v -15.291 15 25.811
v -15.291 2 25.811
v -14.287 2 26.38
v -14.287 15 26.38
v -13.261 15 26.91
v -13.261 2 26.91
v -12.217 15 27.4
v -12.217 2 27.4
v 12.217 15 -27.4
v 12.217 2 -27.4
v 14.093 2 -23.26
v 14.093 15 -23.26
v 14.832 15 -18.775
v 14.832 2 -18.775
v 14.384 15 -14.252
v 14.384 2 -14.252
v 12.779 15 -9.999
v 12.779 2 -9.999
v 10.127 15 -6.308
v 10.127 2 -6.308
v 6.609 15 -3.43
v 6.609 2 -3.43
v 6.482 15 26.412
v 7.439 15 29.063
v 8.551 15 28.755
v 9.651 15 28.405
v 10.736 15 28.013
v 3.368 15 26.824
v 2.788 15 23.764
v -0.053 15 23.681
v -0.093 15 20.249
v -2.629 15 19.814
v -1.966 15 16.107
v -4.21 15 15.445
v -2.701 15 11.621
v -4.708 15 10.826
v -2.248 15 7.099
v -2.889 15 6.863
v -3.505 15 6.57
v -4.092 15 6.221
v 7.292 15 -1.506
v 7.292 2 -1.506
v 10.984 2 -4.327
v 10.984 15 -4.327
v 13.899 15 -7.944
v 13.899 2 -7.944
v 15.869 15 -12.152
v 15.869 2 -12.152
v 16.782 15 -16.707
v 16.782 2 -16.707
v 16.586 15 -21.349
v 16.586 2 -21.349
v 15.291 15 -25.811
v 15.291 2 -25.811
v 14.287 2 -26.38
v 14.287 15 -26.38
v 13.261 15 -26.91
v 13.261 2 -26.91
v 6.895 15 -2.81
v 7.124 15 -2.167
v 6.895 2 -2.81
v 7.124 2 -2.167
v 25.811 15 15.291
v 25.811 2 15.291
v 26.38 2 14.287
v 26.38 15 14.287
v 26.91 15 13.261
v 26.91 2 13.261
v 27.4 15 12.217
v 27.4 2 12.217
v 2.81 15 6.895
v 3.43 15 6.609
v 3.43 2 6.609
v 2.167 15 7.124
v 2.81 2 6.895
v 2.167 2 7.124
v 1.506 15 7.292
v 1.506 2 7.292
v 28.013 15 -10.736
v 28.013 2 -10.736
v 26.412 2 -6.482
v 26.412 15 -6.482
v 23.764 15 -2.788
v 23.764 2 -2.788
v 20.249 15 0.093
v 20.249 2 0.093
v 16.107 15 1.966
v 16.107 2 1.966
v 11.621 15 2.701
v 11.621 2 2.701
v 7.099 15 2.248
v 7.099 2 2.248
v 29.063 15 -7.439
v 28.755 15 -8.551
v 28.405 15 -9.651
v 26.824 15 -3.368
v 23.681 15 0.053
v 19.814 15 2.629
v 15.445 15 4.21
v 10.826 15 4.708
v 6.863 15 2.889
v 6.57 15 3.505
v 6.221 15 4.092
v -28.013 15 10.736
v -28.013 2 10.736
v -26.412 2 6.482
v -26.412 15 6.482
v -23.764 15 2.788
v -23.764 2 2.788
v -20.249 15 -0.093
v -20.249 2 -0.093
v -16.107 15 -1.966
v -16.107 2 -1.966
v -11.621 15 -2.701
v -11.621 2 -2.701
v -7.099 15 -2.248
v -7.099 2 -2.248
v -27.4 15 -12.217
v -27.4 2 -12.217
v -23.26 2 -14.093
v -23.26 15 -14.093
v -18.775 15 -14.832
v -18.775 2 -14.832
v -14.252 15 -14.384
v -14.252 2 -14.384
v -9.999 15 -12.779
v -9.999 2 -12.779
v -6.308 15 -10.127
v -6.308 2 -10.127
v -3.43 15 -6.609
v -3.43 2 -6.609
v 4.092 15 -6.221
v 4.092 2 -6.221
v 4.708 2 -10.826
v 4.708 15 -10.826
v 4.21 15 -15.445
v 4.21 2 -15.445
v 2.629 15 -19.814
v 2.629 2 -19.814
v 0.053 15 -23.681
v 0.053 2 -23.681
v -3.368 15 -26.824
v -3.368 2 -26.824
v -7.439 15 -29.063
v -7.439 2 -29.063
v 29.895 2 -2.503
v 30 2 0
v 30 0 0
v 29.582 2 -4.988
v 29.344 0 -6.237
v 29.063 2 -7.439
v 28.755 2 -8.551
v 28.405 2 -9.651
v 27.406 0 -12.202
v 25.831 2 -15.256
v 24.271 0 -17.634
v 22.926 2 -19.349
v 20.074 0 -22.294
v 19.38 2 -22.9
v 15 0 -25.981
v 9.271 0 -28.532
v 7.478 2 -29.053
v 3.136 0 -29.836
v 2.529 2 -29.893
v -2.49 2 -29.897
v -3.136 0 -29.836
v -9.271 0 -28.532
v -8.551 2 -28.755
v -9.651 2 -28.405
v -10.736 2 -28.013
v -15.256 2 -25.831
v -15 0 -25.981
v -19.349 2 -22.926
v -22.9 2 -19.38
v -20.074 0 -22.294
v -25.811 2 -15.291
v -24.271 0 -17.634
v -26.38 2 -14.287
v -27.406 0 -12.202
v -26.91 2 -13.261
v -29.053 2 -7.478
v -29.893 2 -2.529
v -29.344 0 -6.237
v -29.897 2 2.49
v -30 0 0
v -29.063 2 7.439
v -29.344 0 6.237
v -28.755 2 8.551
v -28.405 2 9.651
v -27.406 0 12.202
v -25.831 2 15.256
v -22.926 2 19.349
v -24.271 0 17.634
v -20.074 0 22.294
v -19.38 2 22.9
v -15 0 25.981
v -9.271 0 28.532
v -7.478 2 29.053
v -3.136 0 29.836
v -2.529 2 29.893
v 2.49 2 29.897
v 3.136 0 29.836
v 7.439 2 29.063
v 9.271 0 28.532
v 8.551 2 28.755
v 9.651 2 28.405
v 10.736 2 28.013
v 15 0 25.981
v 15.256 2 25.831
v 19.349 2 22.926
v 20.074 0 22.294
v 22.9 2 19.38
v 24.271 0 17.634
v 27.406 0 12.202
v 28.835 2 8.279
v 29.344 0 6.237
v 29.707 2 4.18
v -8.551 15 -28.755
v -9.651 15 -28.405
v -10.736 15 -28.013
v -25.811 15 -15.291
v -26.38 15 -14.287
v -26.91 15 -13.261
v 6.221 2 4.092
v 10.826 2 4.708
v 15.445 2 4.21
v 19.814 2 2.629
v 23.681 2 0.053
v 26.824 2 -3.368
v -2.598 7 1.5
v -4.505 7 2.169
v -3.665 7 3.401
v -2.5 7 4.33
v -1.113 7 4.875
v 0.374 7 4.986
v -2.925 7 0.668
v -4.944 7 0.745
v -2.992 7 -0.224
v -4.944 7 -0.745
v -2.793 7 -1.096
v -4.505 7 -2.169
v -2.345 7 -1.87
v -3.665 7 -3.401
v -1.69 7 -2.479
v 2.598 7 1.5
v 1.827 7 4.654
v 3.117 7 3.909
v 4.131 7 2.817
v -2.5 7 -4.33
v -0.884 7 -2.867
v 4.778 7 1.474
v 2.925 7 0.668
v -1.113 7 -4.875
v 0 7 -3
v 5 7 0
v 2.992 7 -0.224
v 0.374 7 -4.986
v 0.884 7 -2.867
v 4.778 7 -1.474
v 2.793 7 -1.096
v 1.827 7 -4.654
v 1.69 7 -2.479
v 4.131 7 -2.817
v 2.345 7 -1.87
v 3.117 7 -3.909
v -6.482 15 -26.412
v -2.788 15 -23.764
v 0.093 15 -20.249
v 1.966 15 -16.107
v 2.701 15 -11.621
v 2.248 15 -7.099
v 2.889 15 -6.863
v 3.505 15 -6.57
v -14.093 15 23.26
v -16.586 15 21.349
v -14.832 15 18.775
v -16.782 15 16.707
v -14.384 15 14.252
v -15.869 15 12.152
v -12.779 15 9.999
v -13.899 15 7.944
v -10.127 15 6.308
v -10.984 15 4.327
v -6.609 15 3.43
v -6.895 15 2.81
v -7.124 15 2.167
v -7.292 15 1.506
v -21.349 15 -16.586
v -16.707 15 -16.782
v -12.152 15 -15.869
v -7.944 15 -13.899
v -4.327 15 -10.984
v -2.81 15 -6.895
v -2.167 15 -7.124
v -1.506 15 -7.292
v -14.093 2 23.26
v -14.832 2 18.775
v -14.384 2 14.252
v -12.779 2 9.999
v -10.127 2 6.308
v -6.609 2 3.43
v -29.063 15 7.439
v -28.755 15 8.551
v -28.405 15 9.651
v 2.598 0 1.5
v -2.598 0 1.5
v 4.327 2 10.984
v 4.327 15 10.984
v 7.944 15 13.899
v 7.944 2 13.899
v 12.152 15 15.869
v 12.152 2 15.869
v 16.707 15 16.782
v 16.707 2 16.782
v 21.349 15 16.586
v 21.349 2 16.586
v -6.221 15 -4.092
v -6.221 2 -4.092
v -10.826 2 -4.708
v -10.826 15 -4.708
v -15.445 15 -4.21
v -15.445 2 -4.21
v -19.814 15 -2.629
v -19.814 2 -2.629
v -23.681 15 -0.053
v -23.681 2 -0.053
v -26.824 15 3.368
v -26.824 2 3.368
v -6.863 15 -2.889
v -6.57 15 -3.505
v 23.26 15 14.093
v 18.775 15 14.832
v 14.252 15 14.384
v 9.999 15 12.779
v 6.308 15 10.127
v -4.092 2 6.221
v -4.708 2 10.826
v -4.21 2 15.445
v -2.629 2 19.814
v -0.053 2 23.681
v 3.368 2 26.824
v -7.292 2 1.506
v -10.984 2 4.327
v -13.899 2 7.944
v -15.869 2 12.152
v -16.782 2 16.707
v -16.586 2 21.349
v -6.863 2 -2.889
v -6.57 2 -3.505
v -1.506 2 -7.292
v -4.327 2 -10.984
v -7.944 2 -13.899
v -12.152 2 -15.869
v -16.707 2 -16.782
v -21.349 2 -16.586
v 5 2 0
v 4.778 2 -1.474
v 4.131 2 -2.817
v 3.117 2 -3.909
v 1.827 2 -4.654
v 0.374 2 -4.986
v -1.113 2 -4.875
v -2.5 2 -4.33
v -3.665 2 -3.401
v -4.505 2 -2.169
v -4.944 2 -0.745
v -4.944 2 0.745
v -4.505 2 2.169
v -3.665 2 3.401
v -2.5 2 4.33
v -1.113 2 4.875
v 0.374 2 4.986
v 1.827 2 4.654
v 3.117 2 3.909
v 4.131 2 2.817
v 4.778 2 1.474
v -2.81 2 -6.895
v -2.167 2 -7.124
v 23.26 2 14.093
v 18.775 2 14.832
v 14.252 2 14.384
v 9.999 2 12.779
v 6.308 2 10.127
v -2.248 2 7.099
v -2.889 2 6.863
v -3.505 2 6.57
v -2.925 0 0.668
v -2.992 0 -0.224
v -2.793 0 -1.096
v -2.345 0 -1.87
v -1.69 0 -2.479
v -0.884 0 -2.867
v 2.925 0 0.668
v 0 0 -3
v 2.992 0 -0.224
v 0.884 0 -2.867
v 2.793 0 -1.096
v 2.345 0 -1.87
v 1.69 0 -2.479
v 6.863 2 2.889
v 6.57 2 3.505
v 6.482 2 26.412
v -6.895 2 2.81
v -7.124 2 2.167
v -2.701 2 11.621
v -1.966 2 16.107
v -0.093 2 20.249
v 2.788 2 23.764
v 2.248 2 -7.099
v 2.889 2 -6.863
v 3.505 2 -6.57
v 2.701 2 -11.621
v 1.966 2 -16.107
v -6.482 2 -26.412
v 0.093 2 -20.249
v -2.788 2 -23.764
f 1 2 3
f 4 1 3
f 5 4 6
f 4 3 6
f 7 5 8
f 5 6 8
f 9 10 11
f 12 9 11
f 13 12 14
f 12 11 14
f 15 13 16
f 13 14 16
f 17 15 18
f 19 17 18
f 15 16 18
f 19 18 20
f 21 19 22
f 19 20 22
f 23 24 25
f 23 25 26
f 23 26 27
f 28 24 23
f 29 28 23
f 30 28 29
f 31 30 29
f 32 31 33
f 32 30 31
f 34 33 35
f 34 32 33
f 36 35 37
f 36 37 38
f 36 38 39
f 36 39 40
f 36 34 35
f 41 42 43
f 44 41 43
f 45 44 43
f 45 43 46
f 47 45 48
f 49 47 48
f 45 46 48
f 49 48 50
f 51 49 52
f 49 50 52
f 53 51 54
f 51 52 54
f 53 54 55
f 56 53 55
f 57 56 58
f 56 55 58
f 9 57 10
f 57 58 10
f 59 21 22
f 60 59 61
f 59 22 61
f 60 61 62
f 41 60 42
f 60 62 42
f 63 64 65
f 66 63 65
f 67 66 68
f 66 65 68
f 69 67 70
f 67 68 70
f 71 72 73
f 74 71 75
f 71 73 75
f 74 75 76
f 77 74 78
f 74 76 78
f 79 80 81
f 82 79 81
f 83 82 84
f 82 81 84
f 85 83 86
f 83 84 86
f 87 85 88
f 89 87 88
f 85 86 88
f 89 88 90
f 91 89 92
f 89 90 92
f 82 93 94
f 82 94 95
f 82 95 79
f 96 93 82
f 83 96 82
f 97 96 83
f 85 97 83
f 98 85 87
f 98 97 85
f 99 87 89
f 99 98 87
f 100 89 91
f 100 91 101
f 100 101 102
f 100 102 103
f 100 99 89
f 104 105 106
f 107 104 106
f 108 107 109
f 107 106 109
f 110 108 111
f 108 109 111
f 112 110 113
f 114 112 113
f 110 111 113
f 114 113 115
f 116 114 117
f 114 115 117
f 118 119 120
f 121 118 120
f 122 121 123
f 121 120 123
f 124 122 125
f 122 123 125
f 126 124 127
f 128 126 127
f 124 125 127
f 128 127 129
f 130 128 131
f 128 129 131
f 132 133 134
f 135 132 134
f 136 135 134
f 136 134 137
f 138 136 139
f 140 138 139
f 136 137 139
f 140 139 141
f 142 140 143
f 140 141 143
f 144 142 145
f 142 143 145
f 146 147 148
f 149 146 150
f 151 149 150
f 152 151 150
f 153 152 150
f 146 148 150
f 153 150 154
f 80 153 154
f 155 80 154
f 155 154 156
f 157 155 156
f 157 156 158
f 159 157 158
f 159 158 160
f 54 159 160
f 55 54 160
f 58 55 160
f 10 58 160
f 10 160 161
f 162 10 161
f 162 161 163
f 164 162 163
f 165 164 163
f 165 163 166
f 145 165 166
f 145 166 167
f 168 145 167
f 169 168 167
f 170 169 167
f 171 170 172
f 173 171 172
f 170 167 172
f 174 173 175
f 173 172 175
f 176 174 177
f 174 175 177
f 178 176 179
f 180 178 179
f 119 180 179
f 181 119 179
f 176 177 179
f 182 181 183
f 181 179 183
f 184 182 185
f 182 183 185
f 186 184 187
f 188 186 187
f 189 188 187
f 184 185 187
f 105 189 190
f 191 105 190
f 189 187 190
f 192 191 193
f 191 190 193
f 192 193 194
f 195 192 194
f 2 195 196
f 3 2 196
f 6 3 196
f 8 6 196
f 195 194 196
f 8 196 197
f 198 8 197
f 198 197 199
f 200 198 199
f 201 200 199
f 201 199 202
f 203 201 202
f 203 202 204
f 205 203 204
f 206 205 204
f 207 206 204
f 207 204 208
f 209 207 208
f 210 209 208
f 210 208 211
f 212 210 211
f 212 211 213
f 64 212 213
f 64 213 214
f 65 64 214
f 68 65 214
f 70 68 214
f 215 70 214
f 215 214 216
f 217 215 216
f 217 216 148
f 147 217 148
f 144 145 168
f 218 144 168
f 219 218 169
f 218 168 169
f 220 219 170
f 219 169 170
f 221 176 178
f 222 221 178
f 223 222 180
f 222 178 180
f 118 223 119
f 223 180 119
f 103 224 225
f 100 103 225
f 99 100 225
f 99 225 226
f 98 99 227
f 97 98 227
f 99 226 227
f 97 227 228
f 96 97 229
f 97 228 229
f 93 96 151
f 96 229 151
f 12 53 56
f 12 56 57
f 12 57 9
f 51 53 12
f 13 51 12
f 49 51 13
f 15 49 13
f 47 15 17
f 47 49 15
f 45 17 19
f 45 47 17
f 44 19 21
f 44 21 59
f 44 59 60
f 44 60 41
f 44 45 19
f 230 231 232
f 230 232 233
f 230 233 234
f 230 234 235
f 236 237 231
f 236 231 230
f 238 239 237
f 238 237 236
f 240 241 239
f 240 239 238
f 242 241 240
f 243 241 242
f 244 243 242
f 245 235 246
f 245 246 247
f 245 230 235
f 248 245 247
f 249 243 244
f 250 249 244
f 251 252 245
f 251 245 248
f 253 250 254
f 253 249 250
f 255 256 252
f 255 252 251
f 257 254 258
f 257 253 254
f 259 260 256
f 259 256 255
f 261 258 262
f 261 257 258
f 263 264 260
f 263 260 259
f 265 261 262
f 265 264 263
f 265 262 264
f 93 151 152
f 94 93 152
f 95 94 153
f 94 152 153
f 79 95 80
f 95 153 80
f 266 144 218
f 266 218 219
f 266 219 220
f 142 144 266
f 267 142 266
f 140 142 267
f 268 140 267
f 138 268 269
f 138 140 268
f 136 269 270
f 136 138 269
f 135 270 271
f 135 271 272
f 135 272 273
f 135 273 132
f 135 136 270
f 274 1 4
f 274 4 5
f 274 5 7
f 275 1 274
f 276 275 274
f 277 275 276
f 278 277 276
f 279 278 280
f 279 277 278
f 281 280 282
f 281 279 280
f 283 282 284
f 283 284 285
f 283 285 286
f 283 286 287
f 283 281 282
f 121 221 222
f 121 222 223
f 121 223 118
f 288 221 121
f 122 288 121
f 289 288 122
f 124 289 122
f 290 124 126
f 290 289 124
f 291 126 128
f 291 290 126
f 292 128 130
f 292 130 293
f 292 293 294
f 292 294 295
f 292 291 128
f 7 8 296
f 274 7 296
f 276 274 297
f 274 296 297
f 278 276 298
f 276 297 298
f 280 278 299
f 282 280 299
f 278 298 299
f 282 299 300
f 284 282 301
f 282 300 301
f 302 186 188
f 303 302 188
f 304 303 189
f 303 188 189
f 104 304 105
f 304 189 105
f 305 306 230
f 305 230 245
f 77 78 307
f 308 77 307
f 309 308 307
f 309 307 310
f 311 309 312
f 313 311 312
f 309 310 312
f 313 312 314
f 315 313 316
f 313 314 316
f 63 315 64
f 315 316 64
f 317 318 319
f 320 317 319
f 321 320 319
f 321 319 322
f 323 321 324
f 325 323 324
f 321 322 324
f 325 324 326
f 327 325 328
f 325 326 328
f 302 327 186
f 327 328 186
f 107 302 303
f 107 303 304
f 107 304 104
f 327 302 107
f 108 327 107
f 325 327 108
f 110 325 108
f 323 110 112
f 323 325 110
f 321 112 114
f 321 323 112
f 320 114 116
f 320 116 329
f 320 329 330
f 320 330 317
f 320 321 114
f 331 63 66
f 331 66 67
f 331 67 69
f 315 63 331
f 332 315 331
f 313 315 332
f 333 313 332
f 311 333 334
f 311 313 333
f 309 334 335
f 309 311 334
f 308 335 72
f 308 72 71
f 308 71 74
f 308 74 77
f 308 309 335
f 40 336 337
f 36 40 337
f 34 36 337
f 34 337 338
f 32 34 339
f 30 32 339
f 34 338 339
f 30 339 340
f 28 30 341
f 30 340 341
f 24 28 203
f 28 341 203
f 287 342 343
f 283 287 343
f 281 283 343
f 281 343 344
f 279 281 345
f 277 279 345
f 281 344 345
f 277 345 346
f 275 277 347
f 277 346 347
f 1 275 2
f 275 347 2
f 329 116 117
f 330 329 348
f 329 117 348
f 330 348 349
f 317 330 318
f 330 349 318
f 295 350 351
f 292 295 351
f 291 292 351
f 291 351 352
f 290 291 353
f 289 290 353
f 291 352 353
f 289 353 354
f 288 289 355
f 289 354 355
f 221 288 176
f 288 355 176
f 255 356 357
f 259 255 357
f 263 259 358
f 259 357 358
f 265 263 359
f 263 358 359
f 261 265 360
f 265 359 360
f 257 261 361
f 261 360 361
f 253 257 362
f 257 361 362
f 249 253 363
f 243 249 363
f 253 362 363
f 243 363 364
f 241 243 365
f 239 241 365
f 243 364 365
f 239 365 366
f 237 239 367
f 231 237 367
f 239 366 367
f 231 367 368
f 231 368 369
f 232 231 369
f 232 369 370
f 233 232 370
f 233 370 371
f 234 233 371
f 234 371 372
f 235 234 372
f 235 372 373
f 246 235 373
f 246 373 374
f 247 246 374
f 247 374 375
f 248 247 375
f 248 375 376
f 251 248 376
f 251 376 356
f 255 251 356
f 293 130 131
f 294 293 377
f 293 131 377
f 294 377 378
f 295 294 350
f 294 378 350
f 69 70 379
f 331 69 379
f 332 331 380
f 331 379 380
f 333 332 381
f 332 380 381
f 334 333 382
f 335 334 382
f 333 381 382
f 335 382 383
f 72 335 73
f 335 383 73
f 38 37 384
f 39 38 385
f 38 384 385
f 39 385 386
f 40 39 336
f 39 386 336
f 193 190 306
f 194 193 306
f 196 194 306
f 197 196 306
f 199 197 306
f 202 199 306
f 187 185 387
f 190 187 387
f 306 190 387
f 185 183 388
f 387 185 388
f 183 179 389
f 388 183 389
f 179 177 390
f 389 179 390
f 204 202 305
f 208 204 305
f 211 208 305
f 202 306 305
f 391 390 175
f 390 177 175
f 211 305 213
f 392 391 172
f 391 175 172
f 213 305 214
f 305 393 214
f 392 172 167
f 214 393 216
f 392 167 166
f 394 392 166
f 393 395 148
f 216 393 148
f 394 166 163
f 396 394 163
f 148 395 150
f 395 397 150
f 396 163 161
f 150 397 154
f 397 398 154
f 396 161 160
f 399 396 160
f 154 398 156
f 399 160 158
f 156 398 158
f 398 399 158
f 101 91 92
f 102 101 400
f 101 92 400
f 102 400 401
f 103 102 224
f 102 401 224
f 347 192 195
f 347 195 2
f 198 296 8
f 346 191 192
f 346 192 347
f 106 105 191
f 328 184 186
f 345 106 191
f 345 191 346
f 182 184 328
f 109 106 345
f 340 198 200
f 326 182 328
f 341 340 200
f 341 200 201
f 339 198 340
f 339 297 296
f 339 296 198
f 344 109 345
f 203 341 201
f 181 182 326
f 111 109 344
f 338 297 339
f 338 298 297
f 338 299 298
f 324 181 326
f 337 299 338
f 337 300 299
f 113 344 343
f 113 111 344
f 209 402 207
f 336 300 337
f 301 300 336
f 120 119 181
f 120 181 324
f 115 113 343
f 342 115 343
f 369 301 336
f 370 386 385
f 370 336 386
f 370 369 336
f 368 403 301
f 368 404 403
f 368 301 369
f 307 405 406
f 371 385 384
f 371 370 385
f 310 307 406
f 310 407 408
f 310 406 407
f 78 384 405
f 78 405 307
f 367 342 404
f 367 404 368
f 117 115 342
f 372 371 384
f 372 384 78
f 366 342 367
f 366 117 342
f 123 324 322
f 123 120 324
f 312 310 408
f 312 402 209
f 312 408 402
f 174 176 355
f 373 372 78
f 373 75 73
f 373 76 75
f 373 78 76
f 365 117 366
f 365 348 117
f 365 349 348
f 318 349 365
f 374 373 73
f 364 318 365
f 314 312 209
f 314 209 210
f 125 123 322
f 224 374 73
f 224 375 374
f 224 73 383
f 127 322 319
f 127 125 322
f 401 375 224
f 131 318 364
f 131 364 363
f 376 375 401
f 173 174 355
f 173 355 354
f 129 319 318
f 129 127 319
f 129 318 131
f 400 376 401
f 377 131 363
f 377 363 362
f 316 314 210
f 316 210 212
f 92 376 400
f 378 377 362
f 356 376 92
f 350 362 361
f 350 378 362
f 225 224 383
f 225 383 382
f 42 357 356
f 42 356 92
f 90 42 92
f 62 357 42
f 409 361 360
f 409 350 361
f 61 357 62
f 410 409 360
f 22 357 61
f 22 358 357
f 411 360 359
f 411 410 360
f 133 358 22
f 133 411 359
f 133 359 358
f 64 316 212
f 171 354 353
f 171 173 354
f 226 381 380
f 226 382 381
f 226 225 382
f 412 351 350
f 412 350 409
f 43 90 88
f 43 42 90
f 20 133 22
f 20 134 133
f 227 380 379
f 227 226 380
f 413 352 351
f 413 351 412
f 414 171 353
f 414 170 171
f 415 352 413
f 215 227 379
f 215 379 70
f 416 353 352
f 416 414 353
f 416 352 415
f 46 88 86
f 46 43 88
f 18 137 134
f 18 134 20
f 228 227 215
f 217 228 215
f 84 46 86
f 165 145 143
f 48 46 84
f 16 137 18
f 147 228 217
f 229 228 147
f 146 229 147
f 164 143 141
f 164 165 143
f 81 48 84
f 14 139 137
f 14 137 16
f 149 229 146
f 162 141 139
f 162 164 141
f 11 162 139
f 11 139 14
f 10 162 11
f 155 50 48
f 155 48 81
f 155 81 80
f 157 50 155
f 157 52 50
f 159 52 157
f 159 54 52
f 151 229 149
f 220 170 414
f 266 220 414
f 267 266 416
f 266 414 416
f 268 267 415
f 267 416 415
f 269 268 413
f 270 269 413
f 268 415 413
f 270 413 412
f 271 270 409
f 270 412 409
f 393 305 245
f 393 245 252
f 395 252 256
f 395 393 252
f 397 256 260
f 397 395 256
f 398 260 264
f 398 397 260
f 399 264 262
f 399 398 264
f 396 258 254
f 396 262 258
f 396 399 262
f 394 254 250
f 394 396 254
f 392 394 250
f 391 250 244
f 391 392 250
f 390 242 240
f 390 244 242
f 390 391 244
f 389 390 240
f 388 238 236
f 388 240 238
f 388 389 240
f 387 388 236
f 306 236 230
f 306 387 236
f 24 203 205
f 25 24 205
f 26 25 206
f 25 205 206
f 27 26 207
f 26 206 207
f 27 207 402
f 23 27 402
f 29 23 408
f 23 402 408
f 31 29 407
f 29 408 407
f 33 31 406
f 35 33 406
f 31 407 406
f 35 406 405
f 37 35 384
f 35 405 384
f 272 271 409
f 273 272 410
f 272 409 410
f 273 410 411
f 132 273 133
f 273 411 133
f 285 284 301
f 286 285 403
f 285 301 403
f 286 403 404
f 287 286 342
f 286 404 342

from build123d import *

# Parameters (mm, degrees)
SKETCH1_R           = 30
BOSS_EXTRUDE1_DEPTH = 2
SKETCH2_R           = 5
BOSS_EXTRUDE2_DEPTH = 7
BOSS_EXTRUDE3_DEPTH = 13
CUT_EXTRUDE1_DEPTH  = 16
CIRPATTERN2_COUNT   = 8


with BuildPart() as part:
    # Sketch1 → Boss-Extrude1 (new body)
    with BuildSketch(Plane(origin=(0, 0, 0), x_dir=(1, 0, 0), z_dir=(0, 1, 0))):
        Circle(SKETCH1_R)
    extrude(amount=BOSS_EXTRUDE1_DEPTH)

    # Sketch2 → Boss-Extrude2 (add)
    with BuildSketch(Plane(origin=(0, 0, 0), x_dir=(1, 0, 0), z_dir=(0, 1, 0))):
        Circle(SKETCH2_R)
    extrude(amount=BOSS_EXTRUDE2_DEPTH)

    # Sketch3 → Boss-Extrude3 (add)
    with BuildSketch(Plane(origin=(0, 2, 0), x_dir=(1, 0, 0), z_dir=(0, 1, 0))):
        with BuildLine():
            ThreePointArc((-1.505806951, 7.292266896), (-12.151790035, 15.86929072), (-25.810761164, 15.290670625))
            ThreePointArc((-25.810761164, 15.290670625), (-26.649690738, 13.776573724), (-27.399897799, 12.216611666))
            ThreePointArc((-27.399897799, 12.216611666), (-14.251932533, 14.383859932), (-3.429686075, 6.60922571))
            ThreePointArc((-3.429686075, 6.60922571), (-2.491266579, 7.016993793), (-1.505806951, 7.292266896))
        make_face()
    boss_extrude3 = extrude(amount=BOSS_EXTRUDE3_DEPTH)

    # Sketch4 → Cut-Extrude1 (cut, through all)
    with BuildSketch(Plane(origin=(0, 0, 0), x_dir=(1, 0, 0), z_dir=(0, 1, 0))):
        with BuildLine():
            Line((-2.598076211, -1.5), (2.598076211, -1.5))
            ThreePointArc((2.598076211, -1.5), (0, 3), (-2.598076211, -1.5))
        make_face()
    extrude(amount=CUT_EXTRUDE1_DEPTH, mode=Mode.SUBTRACT)

    # CirPattern2: Boss-Extrude3 ×8 about axis
    cirpattern2_axis = Axis((0, 0, 0), (0, 1, 0))
    for i in range(1, CIRPATTERN2_COUNT):
        add(boss_extrude3.rotate(cirpattern2_axis, i * 360 / CIRPATTERN2_COUNT))


solid = part.part
